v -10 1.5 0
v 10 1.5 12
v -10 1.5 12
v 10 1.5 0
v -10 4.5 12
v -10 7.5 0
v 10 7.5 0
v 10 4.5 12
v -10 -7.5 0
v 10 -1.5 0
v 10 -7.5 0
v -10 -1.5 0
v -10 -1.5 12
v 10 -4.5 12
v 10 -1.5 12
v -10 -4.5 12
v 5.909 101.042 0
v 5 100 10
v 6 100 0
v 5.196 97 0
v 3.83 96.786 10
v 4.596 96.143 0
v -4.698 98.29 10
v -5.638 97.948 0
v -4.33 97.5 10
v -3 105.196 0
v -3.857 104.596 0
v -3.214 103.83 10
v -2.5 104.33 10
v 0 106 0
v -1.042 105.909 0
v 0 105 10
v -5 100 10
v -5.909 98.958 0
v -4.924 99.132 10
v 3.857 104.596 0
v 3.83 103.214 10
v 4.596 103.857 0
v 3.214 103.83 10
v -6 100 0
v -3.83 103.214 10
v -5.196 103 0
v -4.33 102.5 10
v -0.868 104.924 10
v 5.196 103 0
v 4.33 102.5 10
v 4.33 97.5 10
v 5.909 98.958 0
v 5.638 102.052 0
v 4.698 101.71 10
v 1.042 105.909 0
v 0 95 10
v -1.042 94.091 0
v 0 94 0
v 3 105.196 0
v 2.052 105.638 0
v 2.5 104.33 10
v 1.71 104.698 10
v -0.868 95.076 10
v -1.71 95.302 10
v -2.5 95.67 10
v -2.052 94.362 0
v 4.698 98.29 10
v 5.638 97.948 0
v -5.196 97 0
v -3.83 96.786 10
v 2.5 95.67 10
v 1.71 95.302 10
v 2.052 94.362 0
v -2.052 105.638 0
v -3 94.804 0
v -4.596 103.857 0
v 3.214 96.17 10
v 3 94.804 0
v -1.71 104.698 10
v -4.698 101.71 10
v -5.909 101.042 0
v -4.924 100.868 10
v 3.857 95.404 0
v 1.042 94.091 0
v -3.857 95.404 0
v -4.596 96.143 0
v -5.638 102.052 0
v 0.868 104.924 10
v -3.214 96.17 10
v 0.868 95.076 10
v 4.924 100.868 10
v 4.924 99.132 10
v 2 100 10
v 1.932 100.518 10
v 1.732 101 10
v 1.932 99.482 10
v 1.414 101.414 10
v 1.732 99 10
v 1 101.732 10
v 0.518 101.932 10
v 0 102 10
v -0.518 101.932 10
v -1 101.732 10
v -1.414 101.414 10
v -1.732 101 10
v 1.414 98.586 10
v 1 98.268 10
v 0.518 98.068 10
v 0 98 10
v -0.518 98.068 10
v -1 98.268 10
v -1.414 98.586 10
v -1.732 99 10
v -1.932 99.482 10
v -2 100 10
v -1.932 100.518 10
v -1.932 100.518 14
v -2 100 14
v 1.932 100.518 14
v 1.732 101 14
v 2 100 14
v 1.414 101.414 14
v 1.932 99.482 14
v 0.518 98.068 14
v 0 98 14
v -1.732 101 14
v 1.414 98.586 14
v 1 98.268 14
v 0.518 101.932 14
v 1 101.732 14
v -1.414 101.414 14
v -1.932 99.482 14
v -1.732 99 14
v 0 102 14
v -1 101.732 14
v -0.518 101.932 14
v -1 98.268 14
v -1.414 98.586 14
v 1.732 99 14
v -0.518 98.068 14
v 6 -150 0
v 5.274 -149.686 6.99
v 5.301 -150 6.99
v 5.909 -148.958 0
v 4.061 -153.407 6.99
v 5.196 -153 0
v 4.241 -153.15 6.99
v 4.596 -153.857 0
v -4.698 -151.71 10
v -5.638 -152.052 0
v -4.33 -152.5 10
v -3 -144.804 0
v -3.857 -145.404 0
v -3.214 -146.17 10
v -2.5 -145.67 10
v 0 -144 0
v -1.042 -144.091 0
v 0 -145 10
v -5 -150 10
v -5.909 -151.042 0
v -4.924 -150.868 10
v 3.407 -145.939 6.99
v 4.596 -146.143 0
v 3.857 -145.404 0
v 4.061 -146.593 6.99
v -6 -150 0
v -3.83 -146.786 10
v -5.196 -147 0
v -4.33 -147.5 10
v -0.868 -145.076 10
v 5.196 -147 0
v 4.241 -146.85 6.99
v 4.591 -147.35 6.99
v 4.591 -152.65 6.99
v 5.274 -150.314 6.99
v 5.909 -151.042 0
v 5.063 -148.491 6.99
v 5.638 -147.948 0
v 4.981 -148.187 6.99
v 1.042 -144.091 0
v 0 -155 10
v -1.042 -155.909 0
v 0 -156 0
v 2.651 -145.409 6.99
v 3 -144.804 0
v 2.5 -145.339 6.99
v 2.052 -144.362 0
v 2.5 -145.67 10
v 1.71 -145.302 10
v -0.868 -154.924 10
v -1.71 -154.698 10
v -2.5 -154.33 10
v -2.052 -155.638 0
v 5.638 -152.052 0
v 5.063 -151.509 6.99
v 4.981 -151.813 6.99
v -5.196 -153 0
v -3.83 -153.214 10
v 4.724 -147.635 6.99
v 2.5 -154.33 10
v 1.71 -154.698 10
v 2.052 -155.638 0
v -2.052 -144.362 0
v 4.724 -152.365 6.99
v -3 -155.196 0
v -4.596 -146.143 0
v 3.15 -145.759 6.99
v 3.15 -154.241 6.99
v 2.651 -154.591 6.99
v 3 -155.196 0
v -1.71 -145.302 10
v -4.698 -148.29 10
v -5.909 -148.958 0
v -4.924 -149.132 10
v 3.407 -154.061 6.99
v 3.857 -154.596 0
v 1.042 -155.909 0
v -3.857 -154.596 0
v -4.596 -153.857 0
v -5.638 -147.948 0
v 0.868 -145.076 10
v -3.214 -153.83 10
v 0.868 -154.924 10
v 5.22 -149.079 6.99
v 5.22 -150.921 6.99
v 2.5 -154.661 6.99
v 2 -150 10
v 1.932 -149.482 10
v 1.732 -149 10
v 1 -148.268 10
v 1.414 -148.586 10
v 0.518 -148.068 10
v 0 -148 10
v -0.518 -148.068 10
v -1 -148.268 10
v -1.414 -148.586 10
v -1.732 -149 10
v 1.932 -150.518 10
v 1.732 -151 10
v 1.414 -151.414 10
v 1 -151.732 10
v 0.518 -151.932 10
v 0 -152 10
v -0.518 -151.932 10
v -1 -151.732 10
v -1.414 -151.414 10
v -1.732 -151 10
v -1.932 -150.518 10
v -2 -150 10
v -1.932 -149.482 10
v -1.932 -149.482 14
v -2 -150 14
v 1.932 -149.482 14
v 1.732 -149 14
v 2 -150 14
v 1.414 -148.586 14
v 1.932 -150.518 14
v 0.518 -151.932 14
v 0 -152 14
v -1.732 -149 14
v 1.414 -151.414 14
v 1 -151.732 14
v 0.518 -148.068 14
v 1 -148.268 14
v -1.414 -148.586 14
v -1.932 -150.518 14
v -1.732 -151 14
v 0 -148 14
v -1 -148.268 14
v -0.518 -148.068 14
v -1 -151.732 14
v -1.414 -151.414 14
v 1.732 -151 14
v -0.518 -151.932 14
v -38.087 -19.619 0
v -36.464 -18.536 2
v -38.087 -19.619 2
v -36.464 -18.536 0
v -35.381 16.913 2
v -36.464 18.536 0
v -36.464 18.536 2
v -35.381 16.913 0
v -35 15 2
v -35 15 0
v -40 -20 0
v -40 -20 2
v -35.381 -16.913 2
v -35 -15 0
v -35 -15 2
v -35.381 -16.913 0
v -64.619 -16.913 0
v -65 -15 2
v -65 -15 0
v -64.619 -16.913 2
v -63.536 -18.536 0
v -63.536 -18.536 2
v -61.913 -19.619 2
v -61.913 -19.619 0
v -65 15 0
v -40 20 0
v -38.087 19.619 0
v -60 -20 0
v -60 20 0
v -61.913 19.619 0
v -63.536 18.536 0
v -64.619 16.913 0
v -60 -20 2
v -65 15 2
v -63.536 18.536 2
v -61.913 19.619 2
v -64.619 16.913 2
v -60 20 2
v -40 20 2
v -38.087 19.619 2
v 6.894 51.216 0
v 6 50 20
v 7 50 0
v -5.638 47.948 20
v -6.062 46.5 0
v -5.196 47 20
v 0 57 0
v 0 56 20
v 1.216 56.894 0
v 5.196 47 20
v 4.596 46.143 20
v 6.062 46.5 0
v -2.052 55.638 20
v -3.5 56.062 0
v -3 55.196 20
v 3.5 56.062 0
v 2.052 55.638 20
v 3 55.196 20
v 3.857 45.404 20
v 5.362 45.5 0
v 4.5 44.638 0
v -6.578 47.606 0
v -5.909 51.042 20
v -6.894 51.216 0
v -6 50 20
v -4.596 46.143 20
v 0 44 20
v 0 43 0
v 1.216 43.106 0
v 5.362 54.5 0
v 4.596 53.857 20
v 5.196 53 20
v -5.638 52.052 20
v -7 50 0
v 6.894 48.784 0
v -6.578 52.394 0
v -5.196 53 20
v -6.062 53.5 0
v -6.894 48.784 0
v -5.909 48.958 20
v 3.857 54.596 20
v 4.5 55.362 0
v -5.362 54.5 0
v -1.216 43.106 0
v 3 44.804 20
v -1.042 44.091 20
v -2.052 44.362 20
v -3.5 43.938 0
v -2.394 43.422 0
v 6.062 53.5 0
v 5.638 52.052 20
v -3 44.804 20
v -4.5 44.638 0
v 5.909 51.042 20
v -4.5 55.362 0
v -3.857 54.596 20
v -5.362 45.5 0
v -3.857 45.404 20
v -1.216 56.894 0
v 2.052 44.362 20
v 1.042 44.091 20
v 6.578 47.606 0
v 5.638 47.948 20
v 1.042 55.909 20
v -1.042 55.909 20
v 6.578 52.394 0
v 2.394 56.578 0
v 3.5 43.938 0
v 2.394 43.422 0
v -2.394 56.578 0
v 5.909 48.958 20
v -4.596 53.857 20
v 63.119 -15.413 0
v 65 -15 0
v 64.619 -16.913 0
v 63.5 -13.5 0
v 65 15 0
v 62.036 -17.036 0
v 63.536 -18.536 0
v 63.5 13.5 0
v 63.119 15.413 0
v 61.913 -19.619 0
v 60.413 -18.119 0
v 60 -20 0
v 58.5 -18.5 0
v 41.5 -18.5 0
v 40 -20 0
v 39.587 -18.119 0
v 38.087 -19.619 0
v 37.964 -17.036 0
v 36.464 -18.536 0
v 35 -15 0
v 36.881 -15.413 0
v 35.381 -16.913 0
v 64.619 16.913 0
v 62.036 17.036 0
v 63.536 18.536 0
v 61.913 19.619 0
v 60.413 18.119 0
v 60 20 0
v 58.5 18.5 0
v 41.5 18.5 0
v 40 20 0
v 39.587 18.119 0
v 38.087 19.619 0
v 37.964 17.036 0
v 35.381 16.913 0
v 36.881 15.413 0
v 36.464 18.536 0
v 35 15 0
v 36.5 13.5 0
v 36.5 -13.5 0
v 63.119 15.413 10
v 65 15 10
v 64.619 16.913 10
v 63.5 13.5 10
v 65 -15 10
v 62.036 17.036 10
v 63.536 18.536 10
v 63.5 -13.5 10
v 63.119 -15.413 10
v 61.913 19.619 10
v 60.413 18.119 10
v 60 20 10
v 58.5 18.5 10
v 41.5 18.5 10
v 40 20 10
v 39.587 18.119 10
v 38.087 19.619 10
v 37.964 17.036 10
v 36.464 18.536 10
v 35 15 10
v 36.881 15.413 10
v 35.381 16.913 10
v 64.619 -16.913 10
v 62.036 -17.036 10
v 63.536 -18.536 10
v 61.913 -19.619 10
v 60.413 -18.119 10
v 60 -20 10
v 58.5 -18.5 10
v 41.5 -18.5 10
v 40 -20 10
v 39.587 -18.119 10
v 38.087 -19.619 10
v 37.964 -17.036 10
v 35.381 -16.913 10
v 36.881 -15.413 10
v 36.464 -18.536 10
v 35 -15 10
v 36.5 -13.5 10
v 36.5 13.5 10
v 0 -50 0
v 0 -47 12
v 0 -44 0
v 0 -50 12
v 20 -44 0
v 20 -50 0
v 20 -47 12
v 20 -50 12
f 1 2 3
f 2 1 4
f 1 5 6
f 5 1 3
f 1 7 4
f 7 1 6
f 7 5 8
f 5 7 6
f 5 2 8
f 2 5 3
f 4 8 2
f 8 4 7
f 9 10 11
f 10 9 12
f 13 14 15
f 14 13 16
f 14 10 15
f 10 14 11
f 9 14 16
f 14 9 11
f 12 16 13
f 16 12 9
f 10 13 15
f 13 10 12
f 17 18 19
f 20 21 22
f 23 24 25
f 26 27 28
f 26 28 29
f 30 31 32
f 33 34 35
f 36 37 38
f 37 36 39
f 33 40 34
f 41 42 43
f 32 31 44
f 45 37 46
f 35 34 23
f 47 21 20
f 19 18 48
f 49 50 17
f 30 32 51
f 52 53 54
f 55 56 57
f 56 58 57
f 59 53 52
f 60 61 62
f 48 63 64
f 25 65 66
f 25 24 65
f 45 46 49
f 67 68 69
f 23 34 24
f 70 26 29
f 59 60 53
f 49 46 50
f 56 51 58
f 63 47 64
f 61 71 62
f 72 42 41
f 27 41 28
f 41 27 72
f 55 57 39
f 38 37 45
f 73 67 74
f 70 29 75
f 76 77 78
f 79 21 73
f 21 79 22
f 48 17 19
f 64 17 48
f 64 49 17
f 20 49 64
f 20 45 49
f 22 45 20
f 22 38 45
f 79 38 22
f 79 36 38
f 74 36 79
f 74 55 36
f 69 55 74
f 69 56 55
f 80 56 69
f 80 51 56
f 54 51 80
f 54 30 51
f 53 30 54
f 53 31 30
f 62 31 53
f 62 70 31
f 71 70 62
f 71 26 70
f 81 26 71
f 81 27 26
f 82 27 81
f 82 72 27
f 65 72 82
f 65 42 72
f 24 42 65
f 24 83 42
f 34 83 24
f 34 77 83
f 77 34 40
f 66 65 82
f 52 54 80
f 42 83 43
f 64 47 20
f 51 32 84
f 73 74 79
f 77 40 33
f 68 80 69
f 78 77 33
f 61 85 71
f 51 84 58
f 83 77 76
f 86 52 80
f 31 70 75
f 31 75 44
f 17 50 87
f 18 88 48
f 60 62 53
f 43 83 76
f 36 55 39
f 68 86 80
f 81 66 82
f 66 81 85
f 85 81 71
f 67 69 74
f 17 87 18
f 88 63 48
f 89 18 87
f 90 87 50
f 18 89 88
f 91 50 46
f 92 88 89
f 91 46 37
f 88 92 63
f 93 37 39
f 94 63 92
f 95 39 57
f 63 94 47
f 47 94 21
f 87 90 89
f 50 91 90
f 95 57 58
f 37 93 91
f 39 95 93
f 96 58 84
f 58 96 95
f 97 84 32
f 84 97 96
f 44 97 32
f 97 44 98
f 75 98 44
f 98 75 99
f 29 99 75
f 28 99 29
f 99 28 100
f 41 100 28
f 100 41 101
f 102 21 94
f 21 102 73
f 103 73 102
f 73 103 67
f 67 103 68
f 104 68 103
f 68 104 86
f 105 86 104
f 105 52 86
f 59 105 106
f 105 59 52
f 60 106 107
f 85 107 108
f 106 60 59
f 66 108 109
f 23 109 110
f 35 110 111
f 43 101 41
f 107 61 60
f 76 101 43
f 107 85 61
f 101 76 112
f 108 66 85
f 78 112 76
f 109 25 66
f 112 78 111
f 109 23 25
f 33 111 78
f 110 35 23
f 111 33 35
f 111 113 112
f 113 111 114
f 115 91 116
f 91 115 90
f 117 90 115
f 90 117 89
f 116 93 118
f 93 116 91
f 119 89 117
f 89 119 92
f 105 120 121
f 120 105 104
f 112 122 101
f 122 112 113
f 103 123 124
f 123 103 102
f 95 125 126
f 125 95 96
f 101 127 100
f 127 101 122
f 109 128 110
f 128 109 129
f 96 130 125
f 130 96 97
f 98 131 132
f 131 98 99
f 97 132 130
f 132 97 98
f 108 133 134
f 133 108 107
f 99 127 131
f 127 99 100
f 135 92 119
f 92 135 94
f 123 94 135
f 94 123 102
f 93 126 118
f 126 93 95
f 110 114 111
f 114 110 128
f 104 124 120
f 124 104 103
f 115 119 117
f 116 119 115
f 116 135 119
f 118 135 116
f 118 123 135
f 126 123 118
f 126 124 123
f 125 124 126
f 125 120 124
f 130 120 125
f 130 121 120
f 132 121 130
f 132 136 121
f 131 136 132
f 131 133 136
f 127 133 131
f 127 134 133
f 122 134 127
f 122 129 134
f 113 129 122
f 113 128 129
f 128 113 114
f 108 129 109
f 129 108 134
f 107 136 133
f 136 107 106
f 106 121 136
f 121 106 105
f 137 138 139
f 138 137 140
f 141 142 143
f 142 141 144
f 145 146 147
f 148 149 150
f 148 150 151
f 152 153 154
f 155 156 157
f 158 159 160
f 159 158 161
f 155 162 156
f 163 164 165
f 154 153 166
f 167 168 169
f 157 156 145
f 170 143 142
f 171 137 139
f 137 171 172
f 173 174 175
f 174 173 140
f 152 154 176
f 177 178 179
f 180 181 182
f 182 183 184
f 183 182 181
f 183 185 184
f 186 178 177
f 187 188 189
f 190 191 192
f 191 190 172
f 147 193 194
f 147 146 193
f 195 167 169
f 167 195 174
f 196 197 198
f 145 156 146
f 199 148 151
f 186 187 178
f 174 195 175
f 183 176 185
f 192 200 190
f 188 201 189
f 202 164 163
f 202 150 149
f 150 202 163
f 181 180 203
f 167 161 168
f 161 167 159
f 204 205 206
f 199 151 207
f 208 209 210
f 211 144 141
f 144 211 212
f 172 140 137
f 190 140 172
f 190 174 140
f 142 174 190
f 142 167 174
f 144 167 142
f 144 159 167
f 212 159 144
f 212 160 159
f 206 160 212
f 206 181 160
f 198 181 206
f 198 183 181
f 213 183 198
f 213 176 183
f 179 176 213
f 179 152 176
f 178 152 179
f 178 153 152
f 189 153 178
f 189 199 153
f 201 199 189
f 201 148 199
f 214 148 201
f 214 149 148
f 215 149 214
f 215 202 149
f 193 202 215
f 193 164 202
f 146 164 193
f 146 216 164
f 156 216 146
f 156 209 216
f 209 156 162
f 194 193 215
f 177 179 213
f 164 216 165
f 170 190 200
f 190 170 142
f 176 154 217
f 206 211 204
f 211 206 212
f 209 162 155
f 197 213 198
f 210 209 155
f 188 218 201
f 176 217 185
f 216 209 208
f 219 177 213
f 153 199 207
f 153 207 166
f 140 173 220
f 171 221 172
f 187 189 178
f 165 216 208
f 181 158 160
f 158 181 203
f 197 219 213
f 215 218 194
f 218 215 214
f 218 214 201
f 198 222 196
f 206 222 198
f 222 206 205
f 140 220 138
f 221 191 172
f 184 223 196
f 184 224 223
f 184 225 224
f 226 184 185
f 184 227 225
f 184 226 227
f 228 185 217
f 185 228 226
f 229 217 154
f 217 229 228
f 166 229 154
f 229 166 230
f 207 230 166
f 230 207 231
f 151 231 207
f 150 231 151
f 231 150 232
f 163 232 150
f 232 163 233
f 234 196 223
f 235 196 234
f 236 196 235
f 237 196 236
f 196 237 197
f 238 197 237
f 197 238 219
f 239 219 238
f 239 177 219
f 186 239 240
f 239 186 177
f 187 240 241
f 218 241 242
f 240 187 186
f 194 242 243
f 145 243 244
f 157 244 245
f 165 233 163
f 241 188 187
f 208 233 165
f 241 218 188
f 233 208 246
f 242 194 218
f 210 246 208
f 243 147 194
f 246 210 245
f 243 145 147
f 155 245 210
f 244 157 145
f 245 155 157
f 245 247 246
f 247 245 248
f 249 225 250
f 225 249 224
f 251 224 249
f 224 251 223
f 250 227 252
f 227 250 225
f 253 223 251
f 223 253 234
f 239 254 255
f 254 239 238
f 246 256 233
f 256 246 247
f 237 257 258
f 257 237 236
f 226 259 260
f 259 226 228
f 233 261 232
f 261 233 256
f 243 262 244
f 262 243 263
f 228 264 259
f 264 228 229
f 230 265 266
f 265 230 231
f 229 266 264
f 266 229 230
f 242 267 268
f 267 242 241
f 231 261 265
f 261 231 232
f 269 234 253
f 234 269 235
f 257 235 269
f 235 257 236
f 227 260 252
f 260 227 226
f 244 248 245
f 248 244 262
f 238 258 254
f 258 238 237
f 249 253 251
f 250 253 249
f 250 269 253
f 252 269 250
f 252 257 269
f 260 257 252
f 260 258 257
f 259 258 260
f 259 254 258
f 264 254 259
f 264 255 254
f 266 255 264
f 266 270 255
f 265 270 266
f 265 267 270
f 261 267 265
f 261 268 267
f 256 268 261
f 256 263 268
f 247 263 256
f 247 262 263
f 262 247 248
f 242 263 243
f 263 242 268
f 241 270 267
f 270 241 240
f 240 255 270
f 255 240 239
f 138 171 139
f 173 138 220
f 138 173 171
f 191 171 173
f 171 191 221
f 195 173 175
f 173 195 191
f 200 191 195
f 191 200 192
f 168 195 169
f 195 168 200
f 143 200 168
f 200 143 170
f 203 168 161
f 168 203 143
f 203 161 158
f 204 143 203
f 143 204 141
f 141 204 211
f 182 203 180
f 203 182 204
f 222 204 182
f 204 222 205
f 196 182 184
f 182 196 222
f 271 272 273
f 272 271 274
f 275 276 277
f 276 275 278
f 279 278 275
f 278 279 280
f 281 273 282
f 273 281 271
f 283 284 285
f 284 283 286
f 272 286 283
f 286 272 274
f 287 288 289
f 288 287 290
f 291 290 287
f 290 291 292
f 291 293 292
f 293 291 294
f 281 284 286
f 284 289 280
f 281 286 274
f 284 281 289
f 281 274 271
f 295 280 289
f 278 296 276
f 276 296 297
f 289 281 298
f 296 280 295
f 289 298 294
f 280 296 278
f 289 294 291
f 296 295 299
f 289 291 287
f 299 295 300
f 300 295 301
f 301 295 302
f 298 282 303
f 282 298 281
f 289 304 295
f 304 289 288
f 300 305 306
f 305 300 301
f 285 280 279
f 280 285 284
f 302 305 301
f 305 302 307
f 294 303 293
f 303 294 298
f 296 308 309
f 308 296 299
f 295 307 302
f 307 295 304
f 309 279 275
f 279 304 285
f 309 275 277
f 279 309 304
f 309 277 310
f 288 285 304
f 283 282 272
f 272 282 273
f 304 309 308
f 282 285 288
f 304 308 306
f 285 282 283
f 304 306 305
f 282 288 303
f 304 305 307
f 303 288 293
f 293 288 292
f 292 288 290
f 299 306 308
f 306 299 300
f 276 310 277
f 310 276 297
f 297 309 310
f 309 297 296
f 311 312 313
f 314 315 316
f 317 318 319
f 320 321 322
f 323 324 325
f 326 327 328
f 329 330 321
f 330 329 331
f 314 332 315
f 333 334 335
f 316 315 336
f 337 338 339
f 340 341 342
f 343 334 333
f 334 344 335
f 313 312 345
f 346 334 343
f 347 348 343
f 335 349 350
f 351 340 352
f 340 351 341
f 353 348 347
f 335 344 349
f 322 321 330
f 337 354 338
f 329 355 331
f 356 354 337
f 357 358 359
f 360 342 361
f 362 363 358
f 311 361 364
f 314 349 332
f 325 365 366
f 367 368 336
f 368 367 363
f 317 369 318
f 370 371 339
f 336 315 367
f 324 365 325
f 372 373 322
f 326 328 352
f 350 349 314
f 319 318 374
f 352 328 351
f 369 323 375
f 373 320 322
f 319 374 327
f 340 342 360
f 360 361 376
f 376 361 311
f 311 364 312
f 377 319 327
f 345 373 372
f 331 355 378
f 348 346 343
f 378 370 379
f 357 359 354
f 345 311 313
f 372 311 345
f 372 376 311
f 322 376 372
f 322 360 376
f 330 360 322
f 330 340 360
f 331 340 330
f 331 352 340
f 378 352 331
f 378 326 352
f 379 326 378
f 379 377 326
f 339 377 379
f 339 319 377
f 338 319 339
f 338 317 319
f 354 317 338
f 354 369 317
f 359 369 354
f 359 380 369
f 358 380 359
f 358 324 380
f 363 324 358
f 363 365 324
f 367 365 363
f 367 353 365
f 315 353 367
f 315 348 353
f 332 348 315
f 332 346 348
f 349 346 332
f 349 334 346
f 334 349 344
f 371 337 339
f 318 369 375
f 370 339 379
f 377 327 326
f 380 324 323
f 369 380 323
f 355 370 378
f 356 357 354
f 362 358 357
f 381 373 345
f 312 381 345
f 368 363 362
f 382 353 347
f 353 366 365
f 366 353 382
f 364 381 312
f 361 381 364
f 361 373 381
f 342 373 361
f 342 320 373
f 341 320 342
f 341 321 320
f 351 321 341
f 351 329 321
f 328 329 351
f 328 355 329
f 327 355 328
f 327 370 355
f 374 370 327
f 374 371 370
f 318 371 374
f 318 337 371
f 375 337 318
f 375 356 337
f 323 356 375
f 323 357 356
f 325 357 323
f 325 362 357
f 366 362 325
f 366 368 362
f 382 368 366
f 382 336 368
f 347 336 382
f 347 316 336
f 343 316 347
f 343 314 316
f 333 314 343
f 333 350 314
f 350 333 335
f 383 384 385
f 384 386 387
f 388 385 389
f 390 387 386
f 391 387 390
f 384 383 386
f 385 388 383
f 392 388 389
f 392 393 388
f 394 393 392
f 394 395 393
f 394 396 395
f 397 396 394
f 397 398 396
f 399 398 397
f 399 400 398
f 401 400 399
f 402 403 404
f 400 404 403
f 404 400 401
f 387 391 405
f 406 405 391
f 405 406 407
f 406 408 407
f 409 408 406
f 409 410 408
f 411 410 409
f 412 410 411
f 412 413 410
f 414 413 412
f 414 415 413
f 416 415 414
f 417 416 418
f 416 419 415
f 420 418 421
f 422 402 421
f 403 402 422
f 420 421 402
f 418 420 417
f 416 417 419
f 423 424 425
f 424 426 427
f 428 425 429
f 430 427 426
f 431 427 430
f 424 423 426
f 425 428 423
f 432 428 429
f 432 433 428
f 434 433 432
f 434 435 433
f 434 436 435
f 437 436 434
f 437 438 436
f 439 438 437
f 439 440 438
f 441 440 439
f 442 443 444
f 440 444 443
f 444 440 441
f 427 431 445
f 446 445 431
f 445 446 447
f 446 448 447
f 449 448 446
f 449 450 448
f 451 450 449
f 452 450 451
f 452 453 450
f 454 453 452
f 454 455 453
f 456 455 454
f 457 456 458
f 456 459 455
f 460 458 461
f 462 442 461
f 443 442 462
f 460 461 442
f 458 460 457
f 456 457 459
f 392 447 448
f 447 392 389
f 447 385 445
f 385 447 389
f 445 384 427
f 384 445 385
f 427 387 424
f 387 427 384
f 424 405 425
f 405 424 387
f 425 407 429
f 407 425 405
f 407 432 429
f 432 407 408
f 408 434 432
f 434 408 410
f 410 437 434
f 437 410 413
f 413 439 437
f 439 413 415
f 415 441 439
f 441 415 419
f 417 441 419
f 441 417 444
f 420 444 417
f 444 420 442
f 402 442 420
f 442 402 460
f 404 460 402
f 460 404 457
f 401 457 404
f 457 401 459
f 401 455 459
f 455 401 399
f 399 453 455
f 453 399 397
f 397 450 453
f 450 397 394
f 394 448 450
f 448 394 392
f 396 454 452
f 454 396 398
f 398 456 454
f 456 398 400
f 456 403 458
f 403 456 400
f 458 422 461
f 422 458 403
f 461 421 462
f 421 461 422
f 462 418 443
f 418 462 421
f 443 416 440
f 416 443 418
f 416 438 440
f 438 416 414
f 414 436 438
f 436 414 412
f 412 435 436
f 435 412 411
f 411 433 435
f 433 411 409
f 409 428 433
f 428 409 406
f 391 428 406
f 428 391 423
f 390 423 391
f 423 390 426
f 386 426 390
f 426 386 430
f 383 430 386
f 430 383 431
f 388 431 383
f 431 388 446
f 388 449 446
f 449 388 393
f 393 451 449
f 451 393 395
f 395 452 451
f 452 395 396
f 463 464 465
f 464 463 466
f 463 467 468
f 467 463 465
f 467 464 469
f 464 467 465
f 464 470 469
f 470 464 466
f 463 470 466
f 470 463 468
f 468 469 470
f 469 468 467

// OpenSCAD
// file: primitives.scad
// So that things that _exactly_ difference draw neatly
_comp1 = 0.01;
_comp2 = 0.02;

/** solid riser, no hole, slight taper in (base radius is radi+taper) if taper >
 * 0 */
module
riser(height, radi, taper = 0)
{
    // setting a negative taper will have it taper out at the top wider than the
    // bottom... alt. method using rotation with a squared trapezium //
    // rotate_extrude($fn=36) polygon([[0, 0], [radi + taper, 0], [radi,
    // height], [0, height]]);
    cylinder(height, radi + taper, radi, $fn = 36);
}

/** solid riser with a lug for mounting a PCB. When sizing the lug allow for 3D
 * printing tolerance for fit */
module
riser_with_lug(lug_height, lug_radi, height, radi, taper = 0, $lug_taper = 0)
{
    riser(height, radi, taper);
    translate([ 0, 0, height ])
        cylinder(lug_height, lug_radi, lug_radi + $lug_taper, $fn = 24);
}

/** shave off one side (on the x side) so there can be a wider gap in the middle
 */
module
cut_riser_with_lug(slice_xw,
                   slice_down,
                   lug_height,
                   lug_radi,
                   height,
                   radi,
                   taper = 0,
                   $lug_taper = 0)
{
    difference()
    {
        riser_with_lug(lug_height, lug_radi, height, radi, taper);
        translate([
            radi + taper - slice_xw,
            -radi - taper - _comp1,
            -_comp1 + height -
            slice_down
        ]) cube([ slice_xw, 2 * (radi + taper) + _comp2, slice_down + _comp2 ]);
    }
}

/** base plate, default height, z-centered, centered, rounded corner if bendradi
 * > 0 */
module
baseplate_tmpl(wx, wy, bendradi = 0)
{
    // A key point with the 2d primitives, this is z-centered, whereas when
    // extruded, is not
    if (!bendradi) {
        square([ wx, wy ], center = true);
    } else {
        // https://en.wikibooks.org/wiki/OpenSCAD_User_Manual/Transformations#minkowski
        // We need to take the corner into account
        translate([ bendradi - wx / 2, bendradi - wy / 2 ])
        {
            minkowski()
            {
                square([ wx - bendradi * 2, wy - bendradi * 2 ]);
                circle(r = bendradi);
            }
        }
    }
}

// cornered at 0,0
module
triangularish_riser(height, wx, wy, tx)
{
    translate([ wx, 0 ]) rotate(a = -90, v = [ 0, 1, 0 ]) linear_extrude(wx)
        polygon([ [ 0, 0 ], [ 0, wy ], [ height, tx ], [ height, 0 ] ]);
}

/** Triangularish risers to slot a PCB between; centered */
module
riser_slot_pair(height, gap, wx, wy, tx)
{
    translate([ -wx / 2, gap / 2, 0 ]) triangularish_riser(height, wx, wy, tx);

    translate([ wx / 2, -gap / 2, 0 ]) rotate(a = 180, v = [ 0, 0, 1 ])
        triangularish_riser(height, wx, wy, tx);
}

module
baseplate(base_thickness, wx, wy, bendradi = 0)
{
    linear_extrude(height = base_thickness, convexity = 2)
    {
        baseplate_tmpl(wx, wy, bendradi);
    }
}

/** side walls to match a rounded corner baseplate. bottom lies on z-0 plane */
module
baseplate_wall(wall_thickness, height, wx, wy, bendradi = 0)
{
    // to make a lip on the floor, call this with wx-=inset, wy-=inset
    linear_extrude(height = height, convexity = 2)
    {
        difference()
        {
            baseplate_tmpl(wx, wy, bendradi);
            baseplate_tmpl(wx - wall_thickness, wy - wall_thickness, bendradi);
        }
    }
}

module
logo_stripe()
{
    s = 0.635;
    sw = 0.18;
    polygon([ [ 0, 0 ], [ sw, 0 ], [ sw + s, 1 ], [ s, 1 ] ]);
}

module
logo(w, b)
{
    scale([ w, b ]) union()
    {
        logo_stripe();
        translate([ 0.3, 0 ]) logo_stripe();
        translate([ 0.6, 0 ]) logo_stripe();
        translate([ 0.9, 0 ]) logo_stripe();
    }
}

// SMA plate 12.7mmsq holes inset to 11.1 outer
// main file
include <primitives.scad>

translate([-50, 0])
baseplate(2, 30, 40, 5);

translate([0, 0])
riser_slot_pair(12, 3, 20, 6, 3);

translate([0, 50])
riser(20, 6, 1);

translate([0, 100])
riser_with_lug(4, 2, 10, 5, 1);

translate([0, -150])
cut_riser_with_lug(3.5, 3, 4, 2, 10, 5, 1);

translate([50, 0])
baseplate_wall(3, 10, 30, 40, 5);

translate([0, -50])
triangularish_riser(12, 20, 6, 3);

translate([0, -200])
logo(20, 20);
